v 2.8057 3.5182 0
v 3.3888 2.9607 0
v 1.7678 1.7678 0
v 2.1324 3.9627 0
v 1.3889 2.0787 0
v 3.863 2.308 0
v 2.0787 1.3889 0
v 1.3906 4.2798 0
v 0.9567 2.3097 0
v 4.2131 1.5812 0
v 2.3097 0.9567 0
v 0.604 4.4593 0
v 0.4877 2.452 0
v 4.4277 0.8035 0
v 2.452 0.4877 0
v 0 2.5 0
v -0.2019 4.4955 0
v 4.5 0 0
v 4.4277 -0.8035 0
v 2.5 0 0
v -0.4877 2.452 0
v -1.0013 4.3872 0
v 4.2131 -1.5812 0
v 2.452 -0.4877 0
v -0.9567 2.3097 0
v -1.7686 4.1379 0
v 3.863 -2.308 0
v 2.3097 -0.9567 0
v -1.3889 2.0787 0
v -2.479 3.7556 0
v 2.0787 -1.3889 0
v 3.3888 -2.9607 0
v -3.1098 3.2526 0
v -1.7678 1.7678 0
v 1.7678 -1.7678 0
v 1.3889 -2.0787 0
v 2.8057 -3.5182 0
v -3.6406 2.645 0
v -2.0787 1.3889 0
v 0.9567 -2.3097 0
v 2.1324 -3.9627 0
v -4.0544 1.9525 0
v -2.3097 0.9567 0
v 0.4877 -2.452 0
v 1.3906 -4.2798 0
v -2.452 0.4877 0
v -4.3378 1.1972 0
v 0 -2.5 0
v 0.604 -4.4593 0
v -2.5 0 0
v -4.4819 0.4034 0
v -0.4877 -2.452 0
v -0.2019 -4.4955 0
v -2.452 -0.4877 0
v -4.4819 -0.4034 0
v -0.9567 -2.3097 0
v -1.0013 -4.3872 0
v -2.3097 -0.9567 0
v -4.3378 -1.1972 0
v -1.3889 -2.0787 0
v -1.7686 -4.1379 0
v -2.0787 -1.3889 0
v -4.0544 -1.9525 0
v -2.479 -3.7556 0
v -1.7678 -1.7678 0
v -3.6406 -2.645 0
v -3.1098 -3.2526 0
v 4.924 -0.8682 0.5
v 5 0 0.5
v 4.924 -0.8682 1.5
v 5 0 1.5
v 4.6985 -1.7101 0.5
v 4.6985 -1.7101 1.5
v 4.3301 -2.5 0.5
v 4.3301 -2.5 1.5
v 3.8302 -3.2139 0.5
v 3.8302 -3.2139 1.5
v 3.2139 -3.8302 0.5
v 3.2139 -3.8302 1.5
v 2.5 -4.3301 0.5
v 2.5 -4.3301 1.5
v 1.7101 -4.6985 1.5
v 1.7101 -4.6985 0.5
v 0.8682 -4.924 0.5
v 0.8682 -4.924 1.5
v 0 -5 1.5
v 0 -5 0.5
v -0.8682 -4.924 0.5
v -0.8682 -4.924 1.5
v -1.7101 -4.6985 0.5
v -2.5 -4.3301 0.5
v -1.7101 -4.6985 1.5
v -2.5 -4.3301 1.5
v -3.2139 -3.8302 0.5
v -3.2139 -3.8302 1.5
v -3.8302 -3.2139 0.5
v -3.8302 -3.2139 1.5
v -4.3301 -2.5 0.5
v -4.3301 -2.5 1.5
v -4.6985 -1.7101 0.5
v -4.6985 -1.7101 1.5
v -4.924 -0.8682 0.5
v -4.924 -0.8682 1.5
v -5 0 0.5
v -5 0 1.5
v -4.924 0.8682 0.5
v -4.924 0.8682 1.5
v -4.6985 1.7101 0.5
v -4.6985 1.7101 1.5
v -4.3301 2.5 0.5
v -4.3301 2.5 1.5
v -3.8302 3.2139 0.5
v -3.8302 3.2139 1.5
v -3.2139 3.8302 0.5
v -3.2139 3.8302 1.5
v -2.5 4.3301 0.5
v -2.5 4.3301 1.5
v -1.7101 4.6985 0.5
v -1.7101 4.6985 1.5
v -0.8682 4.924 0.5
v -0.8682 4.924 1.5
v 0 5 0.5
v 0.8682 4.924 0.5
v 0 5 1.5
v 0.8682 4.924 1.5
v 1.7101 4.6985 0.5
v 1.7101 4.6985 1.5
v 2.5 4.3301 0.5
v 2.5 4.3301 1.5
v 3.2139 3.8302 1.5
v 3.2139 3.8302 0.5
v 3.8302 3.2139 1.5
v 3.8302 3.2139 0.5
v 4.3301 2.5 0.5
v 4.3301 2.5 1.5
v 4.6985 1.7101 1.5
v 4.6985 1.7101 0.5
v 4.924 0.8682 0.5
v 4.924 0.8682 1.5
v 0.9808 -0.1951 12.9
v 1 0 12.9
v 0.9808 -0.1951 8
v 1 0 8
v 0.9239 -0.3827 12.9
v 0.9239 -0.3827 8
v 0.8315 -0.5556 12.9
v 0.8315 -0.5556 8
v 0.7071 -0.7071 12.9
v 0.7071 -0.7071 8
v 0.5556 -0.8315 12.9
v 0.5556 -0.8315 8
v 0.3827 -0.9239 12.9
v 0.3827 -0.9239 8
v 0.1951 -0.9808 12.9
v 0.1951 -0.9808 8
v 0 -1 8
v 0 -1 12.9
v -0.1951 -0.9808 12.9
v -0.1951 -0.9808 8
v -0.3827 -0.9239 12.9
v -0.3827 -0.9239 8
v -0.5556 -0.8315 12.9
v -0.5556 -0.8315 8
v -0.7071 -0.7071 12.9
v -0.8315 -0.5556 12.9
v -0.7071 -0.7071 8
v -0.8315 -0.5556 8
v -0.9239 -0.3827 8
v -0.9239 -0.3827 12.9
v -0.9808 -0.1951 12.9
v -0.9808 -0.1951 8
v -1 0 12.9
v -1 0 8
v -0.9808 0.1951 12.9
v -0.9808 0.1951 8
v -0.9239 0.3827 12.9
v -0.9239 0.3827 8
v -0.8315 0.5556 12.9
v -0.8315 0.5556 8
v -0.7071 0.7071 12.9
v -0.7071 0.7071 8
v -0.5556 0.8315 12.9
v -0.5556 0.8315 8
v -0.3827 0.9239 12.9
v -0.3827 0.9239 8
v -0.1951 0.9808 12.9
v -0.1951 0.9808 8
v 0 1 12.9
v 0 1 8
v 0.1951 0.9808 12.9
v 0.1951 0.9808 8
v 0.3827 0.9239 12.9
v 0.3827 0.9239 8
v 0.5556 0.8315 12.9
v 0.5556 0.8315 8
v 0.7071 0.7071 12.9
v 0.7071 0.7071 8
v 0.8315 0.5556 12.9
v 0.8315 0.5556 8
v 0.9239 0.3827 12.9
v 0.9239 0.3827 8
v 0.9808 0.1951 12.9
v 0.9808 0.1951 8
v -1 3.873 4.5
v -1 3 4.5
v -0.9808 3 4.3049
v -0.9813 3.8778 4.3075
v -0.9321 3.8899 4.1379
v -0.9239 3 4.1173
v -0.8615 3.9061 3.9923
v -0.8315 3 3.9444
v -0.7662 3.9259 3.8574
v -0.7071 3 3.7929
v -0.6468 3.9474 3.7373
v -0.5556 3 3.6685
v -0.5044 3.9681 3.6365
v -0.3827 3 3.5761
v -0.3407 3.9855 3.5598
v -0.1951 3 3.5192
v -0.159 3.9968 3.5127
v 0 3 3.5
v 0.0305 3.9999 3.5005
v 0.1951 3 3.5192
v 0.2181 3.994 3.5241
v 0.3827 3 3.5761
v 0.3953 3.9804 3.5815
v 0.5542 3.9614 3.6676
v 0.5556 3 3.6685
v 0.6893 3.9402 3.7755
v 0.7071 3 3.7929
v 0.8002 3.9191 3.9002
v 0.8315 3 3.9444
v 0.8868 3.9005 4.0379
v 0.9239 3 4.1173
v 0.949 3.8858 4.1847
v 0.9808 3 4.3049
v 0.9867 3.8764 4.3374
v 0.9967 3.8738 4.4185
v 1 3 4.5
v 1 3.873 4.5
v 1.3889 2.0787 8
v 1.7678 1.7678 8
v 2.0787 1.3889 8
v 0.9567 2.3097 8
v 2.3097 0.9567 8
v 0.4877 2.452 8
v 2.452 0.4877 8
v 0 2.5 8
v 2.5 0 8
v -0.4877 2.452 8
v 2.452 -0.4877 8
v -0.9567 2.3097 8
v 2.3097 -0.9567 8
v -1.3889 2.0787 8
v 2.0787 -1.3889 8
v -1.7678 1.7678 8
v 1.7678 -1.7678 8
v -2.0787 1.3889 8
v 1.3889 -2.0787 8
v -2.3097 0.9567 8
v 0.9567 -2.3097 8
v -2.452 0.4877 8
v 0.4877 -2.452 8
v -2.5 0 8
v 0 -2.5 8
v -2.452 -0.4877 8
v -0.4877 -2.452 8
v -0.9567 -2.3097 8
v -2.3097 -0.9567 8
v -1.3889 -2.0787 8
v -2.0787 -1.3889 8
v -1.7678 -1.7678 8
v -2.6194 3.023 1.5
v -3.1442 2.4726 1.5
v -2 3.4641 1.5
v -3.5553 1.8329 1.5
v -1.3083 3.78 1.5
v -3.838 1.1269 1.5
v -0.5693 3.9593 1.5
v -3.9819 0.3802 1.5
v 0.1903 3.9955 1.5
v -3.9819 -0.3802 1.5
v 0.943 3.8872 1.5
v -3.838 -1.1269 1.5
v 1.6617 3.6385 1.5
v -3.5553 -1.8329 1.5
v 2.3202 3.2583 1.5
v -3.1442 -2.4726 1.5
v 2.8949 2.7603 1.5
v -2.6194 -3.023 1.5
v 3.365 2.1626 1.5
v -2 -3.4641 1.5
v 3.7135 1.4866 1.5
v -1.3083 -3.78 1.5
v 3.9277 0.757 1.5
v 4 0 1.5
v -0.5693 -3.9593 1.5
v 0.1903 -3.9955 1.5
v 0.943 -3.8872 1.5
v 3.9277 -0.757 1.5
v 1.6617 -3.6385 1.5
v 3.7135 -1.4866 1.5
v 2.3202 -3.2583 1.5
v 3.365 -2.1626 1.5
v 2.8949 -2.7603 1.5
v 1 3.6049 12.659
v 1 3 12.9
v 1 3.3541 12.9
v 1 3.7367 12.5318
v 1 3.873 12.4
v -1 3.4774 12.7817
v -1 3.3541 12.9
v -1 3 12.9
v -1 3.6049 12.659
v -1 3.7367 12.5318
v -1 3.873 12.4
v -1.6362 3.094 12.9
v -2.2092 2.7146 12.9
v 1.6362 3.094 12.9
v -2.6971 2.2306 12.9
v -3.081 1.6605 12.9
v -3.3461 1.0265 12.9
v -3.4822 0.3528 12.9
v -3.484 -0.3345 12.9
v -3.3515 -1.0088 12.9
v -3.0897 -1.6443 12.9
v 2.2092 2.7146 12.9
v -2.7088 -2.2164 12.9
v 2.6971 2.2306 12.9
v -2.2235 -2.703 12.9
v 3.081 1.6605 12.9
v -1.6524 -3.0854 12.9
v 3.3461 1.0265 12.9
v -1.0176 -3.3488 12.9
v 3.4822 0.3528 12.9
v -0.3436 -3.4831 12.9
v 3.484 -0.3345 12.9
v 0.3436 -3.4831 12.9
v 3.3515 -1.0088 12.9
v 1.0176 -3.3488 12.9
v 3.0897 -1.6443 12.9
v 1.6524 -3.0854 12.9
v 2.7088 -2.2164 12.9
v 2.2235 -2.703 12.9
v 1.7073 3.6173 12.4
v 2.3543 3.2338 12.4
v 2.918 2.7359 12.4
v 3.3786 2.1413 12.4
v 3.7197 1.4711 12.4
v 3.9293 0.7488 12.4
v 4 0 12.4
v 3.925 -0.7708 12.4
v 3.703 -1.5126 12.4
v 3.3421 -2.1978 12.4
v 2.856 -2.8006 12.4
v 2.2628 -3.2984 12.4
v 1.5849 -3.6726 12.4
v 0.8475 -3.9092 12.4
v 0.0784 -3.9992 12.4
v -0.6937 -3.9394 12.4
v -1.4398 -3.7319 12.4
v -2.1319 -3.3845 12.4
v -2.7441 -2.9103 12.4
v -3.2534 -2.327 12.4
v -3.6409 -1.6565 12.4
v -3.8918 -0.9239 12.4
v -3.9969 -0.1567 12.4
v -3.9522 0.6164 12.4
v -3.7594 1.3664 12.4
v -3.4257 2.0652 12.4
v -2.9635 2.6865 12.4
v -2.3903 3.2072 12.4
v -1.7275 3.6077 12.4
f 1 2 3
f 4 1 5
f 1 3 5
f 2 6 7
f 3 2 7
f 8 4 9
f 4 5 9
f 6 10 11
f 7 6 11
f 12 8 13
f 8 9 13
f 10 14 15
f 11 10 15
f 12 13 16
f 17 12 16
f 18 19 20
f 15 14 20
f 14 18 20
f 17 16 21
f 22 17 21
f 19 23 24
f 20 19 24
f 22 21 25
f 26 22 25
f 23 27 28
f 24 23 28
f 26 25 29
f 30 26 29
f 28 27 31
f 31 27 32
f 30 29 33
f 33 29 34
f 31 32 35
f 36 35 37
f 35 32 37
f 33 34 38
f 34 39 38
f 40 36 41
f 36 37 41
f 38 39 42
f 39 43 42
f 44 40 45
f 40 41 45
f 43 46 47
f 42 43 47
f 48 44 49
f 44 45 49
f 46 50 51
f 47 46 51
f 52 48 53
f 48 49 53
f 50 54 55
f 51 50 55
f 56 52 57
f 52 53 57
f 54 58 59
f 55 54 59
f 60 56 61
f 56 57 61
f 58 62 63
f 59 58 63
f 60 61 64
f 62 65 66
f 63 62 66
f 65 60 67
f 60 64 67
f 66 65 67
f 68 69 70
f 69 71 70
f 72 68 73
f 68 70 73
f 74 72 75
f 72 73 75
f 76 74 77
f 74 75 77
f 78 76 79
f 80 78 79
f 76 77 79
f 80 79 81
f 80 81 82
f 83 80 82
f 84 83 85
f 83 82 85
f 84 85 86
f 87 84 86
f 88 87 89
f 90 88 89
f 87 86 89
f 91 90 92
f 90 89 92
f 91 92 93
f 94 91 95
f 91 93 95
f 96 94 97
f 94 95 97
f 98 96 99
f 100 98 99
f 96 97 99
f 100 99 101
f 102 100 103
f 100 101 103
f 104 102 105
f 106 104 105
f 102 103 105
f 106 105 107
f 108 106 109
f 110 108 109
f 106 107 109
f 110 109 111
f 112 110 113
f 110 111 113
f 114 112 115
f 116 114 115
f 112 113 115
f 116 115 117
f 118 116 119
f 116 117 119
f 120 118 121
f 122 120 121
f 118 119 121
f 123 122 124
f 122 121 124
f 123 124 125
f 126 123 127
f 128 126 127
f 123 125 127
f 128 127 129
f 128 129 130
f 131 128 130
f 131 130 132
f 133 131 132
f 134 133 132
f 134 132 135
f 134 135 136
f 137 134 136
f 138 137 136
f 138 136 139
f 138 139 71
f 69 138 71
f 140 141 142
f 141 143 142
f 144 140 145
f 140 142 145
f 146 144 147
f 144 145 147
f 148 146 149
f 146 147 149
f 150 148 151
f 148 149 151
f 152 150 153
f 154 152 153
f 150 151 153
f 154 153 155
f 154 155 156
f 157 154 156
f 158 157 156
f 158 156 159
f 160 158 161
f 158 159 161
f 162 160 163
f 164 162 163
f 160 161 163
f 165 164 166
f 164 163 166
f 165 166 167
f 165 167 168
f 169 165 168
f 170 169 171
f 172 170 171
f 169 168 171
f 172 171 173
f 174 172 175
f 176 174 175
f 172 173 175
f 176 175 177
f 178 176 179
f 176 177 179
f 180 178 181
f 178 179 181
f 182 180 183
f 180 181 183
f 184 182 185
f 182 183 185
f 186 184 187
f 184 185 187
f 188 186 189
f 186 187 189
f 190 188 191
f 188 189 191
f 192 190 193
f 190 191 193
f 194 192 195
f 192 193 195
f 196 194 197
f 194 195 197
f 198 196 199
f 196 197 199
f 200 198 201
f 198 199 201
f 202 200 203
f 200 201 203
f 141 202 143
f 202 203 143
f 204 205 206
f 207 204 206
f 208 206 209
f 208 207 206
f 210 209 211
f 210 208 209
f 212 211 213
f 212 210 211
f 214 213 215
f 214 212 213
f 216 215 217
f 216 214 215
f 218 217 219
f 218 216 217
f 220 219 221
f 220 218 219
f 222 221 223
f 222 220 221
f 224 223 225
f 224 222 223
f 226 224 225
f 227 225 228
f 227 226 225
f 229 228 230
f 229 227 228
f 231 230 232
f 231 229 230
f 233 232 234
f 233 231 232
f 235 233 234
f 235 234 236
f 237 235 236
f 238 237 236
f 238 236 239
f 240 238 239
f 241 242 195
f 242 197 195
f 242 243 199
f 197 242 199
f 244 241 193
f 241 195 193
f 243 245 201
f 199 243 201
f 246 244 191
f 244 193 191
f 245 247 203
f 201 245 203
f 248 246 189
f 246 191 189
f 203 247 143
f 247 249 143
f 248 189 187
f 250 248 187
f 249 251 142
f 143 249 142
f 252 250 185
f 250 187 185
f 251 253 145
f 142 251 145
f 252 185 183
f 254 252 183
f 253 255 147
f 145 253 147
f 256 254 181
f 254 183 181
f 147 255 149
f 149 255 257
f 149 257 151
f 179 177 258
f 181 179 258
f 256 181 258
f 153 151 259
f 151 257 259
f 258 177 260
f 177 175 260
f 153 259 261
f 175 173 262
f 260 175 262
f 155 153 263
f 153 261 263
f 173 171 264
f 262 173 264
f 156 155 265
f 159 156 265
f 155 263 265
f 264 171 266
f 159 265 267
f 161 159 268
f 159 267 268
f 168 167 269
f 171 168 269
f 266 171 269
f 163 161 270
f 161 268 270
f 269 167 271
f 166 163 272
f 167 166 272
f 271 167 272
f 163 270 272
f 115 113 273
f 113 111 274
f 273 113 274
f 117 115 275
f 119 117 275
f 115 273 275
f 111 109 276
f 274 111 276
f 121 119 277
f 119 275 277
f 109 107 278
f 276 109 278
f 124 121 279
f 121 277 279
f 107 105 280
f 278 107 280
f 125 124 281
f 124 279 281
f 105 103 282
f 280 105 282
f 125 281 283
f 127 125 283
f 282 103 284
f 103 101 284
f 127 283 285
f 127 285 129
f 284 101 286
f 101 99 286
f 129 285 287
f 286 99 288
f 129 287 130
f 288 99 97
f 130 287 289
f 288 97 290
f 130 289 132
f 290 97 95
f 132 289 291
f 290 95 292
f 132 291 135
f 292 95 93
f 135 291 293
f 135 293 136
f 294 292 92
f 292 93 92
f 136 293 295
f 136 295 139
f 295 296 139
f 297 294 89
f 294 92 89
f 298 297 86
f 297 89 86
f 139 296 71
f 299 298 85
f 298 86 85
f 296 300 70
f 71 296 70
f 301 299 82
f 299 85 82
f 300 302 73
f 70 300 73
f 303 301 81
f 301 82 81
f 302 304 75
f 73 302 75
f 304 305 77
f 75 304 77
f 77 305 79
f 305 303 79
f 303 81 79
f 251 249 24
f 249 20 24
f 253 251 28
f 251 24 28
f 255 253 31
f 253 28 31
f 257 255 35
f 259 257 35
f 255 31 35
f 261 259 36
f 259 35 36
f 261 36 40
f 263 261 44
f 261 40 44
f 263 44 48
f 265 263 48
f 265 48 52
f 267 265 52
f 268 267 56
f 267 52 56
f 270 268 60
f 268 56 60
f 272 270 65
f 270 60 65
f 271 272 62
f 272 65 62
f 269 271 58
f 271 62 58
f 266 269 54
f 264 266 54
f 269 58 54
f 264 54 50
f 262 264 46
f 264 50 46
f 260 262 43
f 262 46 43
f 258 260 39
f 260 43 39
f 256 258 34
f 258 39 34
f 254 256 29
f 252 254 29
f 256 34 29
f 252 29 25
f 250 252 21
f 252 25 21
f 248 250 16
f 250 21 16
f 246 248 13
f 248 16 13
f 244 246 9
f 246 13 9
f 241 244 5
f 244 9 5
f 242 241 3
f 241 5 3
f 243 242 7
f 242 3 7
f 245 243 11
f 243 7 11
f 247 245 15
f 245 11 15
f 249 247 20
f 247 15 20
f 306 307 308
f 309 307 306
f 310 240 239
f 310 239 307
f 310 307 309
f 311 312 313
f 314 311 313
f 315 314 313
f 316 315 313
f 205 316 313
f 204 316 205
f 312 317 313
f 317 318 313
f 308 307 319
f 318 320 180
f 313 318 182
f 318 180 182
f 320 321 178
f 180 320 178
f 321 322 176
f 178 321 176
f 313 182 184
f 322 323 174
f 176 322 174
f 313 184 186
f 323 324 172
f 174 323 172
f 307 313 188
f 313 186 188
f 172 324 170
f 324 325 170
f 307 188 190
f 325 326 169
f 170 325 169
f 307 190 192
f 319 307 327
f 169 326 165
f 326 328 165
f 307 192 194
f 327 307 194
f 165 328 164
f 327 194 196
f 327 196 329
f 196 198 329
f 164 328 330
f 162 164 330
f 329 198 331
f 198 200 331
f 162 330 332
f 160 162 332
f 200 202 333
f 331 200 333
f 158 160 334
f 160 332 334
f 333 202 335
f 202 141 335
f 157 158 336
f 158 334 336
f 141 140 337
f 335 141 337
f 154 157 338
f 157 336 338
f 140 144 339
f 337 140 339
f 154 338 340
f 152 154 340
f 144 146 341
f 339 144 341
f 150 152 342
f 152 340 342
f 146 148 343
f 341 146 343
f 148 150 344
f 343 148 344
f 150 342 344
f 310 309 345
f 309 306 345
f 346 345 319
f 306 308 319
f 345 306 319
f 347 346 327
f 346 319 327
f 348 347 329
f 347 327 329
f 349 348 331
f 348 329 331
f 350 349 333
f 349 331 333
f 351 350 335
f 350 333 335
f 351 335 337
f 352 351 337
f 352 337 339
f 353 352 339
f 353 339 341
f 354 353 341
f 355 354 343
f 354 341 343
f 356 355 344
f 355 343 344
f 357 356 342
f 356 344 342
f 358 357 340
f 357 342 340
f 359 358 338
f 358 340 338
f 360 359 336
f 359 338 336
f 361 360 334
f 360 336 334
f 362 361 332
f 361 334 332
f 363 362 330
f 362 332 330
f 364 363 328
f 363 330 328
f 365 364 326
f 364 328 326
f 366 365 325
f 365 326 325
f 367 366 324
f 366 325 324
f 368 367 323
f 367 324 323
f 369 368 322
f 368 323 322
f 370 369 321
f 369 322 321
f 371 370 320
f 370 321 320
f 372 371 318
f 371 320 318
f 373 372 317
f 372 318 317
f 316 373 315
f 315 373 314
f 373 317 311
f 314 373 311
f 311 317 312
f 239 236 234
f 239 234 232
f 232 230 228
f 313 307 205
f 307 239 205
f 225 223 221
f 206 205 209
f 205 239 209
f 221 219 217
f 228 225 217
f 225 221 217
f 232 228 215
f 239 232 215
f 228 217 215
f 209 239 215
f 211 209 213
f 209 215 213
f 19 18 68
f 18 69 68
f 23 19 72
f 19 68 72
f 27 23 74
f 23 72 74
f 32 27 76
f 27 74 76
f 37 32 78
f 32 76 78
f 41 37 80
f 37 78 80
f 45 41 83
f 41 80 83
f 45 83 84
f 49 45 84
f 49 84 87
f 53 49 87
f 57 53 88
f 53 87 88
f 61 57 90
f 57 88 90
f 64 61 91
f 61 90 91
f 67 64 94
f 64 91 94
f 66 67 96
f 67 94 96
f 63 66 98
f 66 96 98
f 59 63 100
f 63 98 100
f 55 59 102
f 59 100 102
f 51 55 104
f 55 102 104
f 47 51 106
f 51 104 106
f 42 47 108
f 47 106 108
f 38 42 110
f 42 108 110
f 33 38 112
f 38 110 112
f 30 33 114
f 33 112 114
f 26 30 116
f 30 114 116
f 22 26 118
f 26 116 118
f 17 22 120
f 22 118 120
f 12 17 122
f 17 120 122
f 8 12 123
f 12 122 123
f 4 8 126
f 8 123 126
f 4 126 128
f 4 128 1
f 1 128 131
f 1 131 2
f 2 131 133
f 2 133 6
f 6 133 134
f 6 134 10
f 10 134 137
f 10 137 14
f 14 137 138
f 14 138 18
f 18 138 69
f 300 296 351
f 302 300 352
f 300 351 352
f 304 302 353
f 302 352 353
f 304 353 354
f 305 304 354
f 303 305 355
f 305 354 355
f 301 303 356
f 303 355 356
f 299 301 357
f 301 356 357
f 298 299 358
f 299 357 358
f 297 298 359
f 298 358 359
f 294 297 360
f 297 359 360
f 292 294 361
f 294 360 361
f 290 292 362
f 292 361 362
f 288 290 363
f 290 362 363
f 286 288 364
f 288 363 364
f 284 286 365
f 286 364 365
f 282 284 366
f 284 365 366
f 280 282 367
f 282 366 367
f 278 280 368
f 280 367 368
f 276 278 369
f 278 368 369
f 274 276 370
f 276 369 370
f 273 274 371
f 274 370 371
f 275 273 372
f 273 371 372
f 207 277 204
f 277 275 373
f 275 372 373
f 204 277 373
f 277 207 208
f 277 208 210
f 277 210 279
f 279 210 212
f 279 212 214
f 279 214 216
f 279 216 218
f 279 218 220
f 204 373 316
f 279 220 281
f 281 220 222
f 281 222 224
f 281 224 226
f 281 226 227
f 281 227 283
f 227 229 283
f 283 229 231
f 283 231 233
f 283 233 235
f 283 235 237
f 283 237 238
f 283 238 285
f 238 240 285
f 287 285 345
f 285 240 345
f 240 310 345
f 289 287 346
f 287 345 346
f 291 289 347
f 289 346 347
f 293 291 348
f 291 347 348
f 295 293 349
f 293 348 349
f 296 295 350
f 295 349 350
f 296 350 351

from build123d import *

# Parameters (mm, degrees)
CUT_EXTRUDE1_DEPTH = 1


with BuildPart() as part:
    # Sketch1 → Revolve1 (revolve)
    with BuildSketch(Plane(origin=(0, 0, 0), x_dir=(0, 0, -1), z_dir=(1, 0, 0)), mode=Mode.PRIVATE) as revolve1_sk:
        Polygon((0, 2.5), (0, 4.5), (-0.5, 5), (-1.5, 5), (-1.5, 4), (-12.4, 4), (-12.9, 3.5), (-12.9, 1), (-8, 1), (-8, 2.5), align=None)
    revolve(revolve1_sk.sketch.rotate(Axis((0, 0, 0), (0, 0, -1)), 90), axis=Axis((0, 0, 0), (0, 0, -1)))

    # Sketch2 → Cut-Extrude1 (cut)
    with BuildSketch(Plane(origin=(0, 4, 0), x_dir=(1, 0, 0), z_dir=(0, 1, 0))):
        with BuildLine():
            Line((-1, -12.9), (-1, -4.5))
            ThreePointArc((-1, -4.5), (0, -3.5), (1, -4.5))
            Line((1, -4.5), (1, -12.9))
            ThreePointArc((1, -12.9), (0, -13.9), (-1, -12.9))
        make_face()
    extrude(amount=-CUT_EXTRUDE1_DEPTH, mode=Mode.SUBTRACT)


solid = part.part
